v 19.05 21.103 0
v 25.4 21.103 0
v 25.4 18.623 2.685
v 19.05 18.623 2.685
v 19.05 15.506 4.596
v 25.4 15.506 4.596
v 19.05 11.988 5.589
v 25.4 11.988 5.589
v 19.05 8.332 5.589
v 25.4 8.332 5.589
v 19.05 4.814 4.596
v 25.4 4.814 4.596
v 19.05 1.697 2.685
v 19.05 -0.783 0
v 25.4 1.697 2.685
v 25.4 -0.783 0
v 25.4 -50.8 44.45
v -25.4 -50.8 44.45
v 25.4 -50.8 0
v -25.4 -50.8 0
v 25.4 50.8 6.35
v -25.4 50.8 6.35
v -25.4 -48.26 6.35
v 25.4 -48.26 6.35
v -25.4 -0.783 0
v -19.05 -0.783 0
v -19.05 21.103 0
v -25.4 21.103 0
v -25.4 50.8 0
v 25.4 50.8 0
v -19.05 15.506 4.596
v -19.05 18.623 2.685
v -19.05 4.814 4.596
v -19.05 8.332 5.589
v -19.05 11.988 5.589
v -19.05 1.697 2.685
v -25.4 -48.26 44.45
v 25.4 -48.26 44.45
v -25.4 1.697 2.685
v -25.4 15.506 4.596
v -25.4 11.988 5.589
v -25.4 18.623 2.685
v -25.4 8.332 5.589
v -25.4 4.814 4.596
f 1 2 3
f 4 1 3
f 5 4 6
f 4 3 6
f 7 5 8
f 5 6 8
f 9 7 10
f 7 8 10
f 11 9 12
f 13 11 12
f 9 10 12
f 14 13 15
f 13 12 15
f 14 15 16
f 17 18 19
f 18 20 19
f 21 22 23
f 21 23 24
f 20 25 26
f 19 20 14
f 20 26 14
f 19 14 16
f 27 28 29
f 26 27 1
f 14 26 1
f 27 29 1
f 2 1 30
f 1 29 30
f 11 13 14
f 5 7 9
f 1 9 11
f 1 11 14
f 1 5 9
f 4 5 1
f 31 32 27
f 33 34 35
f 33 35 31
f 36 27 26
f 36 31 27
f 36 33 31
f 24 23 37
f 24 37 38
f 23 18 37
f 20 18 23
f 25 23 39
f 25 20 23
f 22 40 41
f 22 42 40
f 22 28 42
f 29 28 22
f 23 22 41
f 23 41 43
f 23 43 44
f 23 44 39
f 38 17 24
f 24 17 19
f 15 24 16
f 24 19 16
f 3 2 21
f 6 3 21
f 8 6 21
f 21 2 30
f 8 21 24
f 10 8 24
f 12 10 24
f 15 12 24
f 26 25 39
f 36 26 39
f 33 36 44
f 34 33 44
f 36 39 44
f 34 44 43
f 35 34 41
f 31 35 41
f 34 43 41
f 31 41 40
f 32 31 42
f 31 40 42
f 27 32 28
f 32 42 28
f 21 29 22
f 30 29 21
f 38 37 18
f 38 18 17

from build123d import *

# Parameters (mm, degrees)
F0_W     = 50.8
F0_H     = 101.6
F1_DEPTH = 6.35
F2_W     = 50.8
F2_H     = 2.54
F3_DEPTH = 38.1
F6_DEPTH = 6.35
F7_DEPTH = 6.35


with BuildPart() as f1:
    # F0 (on Top) → F1 (new body)
    with BuildSketch(Plane.XY):
        Rectangle(F0_W, F0_H)
    extrude(amount=F1_DEPTH)

    # F2 (on face) → F3 (join)
    with BuildSketch(Plane.XY.offset(6.35)):
        with Locations((0, -49.53)):
            Rectangle(F2_W, F2_H)
    extrude(amount=F3_DEPTH)

    # F5 (on face) → F6 (cut)
    with BuildSketch(Plane.YZ.offset(25.4)):
        with BuildLine():
            Line((-0.7833918417, 0), (21.1033918417, 0))
            ThreePointArc((21.1033918417, 0), (10.16, 5.715), (-0.7833918417, 0))
        make_face()
    extrude(amount=-F6_DEPTH, mode=Mode.SUBTRACT)

    # F4 (on face) → F7 (cut)
    with BuildSketch(Plane(origin=(-25.4, 0, 0), x_dir=(0, -1, 0), z_dir=(-1, 0, 0))):
        with BuildLine():
            Line((-21.1033918417, 0), (0.7833918417, 0))
            ThreePointArc((0.7833918417, 0), (-10.16, 5.715), (-21.1033918417, 0))
        make_face()
    extrude(amount=-F7_DEPTH, mode=Mode.SUBTRACT)


solid = f1.part
